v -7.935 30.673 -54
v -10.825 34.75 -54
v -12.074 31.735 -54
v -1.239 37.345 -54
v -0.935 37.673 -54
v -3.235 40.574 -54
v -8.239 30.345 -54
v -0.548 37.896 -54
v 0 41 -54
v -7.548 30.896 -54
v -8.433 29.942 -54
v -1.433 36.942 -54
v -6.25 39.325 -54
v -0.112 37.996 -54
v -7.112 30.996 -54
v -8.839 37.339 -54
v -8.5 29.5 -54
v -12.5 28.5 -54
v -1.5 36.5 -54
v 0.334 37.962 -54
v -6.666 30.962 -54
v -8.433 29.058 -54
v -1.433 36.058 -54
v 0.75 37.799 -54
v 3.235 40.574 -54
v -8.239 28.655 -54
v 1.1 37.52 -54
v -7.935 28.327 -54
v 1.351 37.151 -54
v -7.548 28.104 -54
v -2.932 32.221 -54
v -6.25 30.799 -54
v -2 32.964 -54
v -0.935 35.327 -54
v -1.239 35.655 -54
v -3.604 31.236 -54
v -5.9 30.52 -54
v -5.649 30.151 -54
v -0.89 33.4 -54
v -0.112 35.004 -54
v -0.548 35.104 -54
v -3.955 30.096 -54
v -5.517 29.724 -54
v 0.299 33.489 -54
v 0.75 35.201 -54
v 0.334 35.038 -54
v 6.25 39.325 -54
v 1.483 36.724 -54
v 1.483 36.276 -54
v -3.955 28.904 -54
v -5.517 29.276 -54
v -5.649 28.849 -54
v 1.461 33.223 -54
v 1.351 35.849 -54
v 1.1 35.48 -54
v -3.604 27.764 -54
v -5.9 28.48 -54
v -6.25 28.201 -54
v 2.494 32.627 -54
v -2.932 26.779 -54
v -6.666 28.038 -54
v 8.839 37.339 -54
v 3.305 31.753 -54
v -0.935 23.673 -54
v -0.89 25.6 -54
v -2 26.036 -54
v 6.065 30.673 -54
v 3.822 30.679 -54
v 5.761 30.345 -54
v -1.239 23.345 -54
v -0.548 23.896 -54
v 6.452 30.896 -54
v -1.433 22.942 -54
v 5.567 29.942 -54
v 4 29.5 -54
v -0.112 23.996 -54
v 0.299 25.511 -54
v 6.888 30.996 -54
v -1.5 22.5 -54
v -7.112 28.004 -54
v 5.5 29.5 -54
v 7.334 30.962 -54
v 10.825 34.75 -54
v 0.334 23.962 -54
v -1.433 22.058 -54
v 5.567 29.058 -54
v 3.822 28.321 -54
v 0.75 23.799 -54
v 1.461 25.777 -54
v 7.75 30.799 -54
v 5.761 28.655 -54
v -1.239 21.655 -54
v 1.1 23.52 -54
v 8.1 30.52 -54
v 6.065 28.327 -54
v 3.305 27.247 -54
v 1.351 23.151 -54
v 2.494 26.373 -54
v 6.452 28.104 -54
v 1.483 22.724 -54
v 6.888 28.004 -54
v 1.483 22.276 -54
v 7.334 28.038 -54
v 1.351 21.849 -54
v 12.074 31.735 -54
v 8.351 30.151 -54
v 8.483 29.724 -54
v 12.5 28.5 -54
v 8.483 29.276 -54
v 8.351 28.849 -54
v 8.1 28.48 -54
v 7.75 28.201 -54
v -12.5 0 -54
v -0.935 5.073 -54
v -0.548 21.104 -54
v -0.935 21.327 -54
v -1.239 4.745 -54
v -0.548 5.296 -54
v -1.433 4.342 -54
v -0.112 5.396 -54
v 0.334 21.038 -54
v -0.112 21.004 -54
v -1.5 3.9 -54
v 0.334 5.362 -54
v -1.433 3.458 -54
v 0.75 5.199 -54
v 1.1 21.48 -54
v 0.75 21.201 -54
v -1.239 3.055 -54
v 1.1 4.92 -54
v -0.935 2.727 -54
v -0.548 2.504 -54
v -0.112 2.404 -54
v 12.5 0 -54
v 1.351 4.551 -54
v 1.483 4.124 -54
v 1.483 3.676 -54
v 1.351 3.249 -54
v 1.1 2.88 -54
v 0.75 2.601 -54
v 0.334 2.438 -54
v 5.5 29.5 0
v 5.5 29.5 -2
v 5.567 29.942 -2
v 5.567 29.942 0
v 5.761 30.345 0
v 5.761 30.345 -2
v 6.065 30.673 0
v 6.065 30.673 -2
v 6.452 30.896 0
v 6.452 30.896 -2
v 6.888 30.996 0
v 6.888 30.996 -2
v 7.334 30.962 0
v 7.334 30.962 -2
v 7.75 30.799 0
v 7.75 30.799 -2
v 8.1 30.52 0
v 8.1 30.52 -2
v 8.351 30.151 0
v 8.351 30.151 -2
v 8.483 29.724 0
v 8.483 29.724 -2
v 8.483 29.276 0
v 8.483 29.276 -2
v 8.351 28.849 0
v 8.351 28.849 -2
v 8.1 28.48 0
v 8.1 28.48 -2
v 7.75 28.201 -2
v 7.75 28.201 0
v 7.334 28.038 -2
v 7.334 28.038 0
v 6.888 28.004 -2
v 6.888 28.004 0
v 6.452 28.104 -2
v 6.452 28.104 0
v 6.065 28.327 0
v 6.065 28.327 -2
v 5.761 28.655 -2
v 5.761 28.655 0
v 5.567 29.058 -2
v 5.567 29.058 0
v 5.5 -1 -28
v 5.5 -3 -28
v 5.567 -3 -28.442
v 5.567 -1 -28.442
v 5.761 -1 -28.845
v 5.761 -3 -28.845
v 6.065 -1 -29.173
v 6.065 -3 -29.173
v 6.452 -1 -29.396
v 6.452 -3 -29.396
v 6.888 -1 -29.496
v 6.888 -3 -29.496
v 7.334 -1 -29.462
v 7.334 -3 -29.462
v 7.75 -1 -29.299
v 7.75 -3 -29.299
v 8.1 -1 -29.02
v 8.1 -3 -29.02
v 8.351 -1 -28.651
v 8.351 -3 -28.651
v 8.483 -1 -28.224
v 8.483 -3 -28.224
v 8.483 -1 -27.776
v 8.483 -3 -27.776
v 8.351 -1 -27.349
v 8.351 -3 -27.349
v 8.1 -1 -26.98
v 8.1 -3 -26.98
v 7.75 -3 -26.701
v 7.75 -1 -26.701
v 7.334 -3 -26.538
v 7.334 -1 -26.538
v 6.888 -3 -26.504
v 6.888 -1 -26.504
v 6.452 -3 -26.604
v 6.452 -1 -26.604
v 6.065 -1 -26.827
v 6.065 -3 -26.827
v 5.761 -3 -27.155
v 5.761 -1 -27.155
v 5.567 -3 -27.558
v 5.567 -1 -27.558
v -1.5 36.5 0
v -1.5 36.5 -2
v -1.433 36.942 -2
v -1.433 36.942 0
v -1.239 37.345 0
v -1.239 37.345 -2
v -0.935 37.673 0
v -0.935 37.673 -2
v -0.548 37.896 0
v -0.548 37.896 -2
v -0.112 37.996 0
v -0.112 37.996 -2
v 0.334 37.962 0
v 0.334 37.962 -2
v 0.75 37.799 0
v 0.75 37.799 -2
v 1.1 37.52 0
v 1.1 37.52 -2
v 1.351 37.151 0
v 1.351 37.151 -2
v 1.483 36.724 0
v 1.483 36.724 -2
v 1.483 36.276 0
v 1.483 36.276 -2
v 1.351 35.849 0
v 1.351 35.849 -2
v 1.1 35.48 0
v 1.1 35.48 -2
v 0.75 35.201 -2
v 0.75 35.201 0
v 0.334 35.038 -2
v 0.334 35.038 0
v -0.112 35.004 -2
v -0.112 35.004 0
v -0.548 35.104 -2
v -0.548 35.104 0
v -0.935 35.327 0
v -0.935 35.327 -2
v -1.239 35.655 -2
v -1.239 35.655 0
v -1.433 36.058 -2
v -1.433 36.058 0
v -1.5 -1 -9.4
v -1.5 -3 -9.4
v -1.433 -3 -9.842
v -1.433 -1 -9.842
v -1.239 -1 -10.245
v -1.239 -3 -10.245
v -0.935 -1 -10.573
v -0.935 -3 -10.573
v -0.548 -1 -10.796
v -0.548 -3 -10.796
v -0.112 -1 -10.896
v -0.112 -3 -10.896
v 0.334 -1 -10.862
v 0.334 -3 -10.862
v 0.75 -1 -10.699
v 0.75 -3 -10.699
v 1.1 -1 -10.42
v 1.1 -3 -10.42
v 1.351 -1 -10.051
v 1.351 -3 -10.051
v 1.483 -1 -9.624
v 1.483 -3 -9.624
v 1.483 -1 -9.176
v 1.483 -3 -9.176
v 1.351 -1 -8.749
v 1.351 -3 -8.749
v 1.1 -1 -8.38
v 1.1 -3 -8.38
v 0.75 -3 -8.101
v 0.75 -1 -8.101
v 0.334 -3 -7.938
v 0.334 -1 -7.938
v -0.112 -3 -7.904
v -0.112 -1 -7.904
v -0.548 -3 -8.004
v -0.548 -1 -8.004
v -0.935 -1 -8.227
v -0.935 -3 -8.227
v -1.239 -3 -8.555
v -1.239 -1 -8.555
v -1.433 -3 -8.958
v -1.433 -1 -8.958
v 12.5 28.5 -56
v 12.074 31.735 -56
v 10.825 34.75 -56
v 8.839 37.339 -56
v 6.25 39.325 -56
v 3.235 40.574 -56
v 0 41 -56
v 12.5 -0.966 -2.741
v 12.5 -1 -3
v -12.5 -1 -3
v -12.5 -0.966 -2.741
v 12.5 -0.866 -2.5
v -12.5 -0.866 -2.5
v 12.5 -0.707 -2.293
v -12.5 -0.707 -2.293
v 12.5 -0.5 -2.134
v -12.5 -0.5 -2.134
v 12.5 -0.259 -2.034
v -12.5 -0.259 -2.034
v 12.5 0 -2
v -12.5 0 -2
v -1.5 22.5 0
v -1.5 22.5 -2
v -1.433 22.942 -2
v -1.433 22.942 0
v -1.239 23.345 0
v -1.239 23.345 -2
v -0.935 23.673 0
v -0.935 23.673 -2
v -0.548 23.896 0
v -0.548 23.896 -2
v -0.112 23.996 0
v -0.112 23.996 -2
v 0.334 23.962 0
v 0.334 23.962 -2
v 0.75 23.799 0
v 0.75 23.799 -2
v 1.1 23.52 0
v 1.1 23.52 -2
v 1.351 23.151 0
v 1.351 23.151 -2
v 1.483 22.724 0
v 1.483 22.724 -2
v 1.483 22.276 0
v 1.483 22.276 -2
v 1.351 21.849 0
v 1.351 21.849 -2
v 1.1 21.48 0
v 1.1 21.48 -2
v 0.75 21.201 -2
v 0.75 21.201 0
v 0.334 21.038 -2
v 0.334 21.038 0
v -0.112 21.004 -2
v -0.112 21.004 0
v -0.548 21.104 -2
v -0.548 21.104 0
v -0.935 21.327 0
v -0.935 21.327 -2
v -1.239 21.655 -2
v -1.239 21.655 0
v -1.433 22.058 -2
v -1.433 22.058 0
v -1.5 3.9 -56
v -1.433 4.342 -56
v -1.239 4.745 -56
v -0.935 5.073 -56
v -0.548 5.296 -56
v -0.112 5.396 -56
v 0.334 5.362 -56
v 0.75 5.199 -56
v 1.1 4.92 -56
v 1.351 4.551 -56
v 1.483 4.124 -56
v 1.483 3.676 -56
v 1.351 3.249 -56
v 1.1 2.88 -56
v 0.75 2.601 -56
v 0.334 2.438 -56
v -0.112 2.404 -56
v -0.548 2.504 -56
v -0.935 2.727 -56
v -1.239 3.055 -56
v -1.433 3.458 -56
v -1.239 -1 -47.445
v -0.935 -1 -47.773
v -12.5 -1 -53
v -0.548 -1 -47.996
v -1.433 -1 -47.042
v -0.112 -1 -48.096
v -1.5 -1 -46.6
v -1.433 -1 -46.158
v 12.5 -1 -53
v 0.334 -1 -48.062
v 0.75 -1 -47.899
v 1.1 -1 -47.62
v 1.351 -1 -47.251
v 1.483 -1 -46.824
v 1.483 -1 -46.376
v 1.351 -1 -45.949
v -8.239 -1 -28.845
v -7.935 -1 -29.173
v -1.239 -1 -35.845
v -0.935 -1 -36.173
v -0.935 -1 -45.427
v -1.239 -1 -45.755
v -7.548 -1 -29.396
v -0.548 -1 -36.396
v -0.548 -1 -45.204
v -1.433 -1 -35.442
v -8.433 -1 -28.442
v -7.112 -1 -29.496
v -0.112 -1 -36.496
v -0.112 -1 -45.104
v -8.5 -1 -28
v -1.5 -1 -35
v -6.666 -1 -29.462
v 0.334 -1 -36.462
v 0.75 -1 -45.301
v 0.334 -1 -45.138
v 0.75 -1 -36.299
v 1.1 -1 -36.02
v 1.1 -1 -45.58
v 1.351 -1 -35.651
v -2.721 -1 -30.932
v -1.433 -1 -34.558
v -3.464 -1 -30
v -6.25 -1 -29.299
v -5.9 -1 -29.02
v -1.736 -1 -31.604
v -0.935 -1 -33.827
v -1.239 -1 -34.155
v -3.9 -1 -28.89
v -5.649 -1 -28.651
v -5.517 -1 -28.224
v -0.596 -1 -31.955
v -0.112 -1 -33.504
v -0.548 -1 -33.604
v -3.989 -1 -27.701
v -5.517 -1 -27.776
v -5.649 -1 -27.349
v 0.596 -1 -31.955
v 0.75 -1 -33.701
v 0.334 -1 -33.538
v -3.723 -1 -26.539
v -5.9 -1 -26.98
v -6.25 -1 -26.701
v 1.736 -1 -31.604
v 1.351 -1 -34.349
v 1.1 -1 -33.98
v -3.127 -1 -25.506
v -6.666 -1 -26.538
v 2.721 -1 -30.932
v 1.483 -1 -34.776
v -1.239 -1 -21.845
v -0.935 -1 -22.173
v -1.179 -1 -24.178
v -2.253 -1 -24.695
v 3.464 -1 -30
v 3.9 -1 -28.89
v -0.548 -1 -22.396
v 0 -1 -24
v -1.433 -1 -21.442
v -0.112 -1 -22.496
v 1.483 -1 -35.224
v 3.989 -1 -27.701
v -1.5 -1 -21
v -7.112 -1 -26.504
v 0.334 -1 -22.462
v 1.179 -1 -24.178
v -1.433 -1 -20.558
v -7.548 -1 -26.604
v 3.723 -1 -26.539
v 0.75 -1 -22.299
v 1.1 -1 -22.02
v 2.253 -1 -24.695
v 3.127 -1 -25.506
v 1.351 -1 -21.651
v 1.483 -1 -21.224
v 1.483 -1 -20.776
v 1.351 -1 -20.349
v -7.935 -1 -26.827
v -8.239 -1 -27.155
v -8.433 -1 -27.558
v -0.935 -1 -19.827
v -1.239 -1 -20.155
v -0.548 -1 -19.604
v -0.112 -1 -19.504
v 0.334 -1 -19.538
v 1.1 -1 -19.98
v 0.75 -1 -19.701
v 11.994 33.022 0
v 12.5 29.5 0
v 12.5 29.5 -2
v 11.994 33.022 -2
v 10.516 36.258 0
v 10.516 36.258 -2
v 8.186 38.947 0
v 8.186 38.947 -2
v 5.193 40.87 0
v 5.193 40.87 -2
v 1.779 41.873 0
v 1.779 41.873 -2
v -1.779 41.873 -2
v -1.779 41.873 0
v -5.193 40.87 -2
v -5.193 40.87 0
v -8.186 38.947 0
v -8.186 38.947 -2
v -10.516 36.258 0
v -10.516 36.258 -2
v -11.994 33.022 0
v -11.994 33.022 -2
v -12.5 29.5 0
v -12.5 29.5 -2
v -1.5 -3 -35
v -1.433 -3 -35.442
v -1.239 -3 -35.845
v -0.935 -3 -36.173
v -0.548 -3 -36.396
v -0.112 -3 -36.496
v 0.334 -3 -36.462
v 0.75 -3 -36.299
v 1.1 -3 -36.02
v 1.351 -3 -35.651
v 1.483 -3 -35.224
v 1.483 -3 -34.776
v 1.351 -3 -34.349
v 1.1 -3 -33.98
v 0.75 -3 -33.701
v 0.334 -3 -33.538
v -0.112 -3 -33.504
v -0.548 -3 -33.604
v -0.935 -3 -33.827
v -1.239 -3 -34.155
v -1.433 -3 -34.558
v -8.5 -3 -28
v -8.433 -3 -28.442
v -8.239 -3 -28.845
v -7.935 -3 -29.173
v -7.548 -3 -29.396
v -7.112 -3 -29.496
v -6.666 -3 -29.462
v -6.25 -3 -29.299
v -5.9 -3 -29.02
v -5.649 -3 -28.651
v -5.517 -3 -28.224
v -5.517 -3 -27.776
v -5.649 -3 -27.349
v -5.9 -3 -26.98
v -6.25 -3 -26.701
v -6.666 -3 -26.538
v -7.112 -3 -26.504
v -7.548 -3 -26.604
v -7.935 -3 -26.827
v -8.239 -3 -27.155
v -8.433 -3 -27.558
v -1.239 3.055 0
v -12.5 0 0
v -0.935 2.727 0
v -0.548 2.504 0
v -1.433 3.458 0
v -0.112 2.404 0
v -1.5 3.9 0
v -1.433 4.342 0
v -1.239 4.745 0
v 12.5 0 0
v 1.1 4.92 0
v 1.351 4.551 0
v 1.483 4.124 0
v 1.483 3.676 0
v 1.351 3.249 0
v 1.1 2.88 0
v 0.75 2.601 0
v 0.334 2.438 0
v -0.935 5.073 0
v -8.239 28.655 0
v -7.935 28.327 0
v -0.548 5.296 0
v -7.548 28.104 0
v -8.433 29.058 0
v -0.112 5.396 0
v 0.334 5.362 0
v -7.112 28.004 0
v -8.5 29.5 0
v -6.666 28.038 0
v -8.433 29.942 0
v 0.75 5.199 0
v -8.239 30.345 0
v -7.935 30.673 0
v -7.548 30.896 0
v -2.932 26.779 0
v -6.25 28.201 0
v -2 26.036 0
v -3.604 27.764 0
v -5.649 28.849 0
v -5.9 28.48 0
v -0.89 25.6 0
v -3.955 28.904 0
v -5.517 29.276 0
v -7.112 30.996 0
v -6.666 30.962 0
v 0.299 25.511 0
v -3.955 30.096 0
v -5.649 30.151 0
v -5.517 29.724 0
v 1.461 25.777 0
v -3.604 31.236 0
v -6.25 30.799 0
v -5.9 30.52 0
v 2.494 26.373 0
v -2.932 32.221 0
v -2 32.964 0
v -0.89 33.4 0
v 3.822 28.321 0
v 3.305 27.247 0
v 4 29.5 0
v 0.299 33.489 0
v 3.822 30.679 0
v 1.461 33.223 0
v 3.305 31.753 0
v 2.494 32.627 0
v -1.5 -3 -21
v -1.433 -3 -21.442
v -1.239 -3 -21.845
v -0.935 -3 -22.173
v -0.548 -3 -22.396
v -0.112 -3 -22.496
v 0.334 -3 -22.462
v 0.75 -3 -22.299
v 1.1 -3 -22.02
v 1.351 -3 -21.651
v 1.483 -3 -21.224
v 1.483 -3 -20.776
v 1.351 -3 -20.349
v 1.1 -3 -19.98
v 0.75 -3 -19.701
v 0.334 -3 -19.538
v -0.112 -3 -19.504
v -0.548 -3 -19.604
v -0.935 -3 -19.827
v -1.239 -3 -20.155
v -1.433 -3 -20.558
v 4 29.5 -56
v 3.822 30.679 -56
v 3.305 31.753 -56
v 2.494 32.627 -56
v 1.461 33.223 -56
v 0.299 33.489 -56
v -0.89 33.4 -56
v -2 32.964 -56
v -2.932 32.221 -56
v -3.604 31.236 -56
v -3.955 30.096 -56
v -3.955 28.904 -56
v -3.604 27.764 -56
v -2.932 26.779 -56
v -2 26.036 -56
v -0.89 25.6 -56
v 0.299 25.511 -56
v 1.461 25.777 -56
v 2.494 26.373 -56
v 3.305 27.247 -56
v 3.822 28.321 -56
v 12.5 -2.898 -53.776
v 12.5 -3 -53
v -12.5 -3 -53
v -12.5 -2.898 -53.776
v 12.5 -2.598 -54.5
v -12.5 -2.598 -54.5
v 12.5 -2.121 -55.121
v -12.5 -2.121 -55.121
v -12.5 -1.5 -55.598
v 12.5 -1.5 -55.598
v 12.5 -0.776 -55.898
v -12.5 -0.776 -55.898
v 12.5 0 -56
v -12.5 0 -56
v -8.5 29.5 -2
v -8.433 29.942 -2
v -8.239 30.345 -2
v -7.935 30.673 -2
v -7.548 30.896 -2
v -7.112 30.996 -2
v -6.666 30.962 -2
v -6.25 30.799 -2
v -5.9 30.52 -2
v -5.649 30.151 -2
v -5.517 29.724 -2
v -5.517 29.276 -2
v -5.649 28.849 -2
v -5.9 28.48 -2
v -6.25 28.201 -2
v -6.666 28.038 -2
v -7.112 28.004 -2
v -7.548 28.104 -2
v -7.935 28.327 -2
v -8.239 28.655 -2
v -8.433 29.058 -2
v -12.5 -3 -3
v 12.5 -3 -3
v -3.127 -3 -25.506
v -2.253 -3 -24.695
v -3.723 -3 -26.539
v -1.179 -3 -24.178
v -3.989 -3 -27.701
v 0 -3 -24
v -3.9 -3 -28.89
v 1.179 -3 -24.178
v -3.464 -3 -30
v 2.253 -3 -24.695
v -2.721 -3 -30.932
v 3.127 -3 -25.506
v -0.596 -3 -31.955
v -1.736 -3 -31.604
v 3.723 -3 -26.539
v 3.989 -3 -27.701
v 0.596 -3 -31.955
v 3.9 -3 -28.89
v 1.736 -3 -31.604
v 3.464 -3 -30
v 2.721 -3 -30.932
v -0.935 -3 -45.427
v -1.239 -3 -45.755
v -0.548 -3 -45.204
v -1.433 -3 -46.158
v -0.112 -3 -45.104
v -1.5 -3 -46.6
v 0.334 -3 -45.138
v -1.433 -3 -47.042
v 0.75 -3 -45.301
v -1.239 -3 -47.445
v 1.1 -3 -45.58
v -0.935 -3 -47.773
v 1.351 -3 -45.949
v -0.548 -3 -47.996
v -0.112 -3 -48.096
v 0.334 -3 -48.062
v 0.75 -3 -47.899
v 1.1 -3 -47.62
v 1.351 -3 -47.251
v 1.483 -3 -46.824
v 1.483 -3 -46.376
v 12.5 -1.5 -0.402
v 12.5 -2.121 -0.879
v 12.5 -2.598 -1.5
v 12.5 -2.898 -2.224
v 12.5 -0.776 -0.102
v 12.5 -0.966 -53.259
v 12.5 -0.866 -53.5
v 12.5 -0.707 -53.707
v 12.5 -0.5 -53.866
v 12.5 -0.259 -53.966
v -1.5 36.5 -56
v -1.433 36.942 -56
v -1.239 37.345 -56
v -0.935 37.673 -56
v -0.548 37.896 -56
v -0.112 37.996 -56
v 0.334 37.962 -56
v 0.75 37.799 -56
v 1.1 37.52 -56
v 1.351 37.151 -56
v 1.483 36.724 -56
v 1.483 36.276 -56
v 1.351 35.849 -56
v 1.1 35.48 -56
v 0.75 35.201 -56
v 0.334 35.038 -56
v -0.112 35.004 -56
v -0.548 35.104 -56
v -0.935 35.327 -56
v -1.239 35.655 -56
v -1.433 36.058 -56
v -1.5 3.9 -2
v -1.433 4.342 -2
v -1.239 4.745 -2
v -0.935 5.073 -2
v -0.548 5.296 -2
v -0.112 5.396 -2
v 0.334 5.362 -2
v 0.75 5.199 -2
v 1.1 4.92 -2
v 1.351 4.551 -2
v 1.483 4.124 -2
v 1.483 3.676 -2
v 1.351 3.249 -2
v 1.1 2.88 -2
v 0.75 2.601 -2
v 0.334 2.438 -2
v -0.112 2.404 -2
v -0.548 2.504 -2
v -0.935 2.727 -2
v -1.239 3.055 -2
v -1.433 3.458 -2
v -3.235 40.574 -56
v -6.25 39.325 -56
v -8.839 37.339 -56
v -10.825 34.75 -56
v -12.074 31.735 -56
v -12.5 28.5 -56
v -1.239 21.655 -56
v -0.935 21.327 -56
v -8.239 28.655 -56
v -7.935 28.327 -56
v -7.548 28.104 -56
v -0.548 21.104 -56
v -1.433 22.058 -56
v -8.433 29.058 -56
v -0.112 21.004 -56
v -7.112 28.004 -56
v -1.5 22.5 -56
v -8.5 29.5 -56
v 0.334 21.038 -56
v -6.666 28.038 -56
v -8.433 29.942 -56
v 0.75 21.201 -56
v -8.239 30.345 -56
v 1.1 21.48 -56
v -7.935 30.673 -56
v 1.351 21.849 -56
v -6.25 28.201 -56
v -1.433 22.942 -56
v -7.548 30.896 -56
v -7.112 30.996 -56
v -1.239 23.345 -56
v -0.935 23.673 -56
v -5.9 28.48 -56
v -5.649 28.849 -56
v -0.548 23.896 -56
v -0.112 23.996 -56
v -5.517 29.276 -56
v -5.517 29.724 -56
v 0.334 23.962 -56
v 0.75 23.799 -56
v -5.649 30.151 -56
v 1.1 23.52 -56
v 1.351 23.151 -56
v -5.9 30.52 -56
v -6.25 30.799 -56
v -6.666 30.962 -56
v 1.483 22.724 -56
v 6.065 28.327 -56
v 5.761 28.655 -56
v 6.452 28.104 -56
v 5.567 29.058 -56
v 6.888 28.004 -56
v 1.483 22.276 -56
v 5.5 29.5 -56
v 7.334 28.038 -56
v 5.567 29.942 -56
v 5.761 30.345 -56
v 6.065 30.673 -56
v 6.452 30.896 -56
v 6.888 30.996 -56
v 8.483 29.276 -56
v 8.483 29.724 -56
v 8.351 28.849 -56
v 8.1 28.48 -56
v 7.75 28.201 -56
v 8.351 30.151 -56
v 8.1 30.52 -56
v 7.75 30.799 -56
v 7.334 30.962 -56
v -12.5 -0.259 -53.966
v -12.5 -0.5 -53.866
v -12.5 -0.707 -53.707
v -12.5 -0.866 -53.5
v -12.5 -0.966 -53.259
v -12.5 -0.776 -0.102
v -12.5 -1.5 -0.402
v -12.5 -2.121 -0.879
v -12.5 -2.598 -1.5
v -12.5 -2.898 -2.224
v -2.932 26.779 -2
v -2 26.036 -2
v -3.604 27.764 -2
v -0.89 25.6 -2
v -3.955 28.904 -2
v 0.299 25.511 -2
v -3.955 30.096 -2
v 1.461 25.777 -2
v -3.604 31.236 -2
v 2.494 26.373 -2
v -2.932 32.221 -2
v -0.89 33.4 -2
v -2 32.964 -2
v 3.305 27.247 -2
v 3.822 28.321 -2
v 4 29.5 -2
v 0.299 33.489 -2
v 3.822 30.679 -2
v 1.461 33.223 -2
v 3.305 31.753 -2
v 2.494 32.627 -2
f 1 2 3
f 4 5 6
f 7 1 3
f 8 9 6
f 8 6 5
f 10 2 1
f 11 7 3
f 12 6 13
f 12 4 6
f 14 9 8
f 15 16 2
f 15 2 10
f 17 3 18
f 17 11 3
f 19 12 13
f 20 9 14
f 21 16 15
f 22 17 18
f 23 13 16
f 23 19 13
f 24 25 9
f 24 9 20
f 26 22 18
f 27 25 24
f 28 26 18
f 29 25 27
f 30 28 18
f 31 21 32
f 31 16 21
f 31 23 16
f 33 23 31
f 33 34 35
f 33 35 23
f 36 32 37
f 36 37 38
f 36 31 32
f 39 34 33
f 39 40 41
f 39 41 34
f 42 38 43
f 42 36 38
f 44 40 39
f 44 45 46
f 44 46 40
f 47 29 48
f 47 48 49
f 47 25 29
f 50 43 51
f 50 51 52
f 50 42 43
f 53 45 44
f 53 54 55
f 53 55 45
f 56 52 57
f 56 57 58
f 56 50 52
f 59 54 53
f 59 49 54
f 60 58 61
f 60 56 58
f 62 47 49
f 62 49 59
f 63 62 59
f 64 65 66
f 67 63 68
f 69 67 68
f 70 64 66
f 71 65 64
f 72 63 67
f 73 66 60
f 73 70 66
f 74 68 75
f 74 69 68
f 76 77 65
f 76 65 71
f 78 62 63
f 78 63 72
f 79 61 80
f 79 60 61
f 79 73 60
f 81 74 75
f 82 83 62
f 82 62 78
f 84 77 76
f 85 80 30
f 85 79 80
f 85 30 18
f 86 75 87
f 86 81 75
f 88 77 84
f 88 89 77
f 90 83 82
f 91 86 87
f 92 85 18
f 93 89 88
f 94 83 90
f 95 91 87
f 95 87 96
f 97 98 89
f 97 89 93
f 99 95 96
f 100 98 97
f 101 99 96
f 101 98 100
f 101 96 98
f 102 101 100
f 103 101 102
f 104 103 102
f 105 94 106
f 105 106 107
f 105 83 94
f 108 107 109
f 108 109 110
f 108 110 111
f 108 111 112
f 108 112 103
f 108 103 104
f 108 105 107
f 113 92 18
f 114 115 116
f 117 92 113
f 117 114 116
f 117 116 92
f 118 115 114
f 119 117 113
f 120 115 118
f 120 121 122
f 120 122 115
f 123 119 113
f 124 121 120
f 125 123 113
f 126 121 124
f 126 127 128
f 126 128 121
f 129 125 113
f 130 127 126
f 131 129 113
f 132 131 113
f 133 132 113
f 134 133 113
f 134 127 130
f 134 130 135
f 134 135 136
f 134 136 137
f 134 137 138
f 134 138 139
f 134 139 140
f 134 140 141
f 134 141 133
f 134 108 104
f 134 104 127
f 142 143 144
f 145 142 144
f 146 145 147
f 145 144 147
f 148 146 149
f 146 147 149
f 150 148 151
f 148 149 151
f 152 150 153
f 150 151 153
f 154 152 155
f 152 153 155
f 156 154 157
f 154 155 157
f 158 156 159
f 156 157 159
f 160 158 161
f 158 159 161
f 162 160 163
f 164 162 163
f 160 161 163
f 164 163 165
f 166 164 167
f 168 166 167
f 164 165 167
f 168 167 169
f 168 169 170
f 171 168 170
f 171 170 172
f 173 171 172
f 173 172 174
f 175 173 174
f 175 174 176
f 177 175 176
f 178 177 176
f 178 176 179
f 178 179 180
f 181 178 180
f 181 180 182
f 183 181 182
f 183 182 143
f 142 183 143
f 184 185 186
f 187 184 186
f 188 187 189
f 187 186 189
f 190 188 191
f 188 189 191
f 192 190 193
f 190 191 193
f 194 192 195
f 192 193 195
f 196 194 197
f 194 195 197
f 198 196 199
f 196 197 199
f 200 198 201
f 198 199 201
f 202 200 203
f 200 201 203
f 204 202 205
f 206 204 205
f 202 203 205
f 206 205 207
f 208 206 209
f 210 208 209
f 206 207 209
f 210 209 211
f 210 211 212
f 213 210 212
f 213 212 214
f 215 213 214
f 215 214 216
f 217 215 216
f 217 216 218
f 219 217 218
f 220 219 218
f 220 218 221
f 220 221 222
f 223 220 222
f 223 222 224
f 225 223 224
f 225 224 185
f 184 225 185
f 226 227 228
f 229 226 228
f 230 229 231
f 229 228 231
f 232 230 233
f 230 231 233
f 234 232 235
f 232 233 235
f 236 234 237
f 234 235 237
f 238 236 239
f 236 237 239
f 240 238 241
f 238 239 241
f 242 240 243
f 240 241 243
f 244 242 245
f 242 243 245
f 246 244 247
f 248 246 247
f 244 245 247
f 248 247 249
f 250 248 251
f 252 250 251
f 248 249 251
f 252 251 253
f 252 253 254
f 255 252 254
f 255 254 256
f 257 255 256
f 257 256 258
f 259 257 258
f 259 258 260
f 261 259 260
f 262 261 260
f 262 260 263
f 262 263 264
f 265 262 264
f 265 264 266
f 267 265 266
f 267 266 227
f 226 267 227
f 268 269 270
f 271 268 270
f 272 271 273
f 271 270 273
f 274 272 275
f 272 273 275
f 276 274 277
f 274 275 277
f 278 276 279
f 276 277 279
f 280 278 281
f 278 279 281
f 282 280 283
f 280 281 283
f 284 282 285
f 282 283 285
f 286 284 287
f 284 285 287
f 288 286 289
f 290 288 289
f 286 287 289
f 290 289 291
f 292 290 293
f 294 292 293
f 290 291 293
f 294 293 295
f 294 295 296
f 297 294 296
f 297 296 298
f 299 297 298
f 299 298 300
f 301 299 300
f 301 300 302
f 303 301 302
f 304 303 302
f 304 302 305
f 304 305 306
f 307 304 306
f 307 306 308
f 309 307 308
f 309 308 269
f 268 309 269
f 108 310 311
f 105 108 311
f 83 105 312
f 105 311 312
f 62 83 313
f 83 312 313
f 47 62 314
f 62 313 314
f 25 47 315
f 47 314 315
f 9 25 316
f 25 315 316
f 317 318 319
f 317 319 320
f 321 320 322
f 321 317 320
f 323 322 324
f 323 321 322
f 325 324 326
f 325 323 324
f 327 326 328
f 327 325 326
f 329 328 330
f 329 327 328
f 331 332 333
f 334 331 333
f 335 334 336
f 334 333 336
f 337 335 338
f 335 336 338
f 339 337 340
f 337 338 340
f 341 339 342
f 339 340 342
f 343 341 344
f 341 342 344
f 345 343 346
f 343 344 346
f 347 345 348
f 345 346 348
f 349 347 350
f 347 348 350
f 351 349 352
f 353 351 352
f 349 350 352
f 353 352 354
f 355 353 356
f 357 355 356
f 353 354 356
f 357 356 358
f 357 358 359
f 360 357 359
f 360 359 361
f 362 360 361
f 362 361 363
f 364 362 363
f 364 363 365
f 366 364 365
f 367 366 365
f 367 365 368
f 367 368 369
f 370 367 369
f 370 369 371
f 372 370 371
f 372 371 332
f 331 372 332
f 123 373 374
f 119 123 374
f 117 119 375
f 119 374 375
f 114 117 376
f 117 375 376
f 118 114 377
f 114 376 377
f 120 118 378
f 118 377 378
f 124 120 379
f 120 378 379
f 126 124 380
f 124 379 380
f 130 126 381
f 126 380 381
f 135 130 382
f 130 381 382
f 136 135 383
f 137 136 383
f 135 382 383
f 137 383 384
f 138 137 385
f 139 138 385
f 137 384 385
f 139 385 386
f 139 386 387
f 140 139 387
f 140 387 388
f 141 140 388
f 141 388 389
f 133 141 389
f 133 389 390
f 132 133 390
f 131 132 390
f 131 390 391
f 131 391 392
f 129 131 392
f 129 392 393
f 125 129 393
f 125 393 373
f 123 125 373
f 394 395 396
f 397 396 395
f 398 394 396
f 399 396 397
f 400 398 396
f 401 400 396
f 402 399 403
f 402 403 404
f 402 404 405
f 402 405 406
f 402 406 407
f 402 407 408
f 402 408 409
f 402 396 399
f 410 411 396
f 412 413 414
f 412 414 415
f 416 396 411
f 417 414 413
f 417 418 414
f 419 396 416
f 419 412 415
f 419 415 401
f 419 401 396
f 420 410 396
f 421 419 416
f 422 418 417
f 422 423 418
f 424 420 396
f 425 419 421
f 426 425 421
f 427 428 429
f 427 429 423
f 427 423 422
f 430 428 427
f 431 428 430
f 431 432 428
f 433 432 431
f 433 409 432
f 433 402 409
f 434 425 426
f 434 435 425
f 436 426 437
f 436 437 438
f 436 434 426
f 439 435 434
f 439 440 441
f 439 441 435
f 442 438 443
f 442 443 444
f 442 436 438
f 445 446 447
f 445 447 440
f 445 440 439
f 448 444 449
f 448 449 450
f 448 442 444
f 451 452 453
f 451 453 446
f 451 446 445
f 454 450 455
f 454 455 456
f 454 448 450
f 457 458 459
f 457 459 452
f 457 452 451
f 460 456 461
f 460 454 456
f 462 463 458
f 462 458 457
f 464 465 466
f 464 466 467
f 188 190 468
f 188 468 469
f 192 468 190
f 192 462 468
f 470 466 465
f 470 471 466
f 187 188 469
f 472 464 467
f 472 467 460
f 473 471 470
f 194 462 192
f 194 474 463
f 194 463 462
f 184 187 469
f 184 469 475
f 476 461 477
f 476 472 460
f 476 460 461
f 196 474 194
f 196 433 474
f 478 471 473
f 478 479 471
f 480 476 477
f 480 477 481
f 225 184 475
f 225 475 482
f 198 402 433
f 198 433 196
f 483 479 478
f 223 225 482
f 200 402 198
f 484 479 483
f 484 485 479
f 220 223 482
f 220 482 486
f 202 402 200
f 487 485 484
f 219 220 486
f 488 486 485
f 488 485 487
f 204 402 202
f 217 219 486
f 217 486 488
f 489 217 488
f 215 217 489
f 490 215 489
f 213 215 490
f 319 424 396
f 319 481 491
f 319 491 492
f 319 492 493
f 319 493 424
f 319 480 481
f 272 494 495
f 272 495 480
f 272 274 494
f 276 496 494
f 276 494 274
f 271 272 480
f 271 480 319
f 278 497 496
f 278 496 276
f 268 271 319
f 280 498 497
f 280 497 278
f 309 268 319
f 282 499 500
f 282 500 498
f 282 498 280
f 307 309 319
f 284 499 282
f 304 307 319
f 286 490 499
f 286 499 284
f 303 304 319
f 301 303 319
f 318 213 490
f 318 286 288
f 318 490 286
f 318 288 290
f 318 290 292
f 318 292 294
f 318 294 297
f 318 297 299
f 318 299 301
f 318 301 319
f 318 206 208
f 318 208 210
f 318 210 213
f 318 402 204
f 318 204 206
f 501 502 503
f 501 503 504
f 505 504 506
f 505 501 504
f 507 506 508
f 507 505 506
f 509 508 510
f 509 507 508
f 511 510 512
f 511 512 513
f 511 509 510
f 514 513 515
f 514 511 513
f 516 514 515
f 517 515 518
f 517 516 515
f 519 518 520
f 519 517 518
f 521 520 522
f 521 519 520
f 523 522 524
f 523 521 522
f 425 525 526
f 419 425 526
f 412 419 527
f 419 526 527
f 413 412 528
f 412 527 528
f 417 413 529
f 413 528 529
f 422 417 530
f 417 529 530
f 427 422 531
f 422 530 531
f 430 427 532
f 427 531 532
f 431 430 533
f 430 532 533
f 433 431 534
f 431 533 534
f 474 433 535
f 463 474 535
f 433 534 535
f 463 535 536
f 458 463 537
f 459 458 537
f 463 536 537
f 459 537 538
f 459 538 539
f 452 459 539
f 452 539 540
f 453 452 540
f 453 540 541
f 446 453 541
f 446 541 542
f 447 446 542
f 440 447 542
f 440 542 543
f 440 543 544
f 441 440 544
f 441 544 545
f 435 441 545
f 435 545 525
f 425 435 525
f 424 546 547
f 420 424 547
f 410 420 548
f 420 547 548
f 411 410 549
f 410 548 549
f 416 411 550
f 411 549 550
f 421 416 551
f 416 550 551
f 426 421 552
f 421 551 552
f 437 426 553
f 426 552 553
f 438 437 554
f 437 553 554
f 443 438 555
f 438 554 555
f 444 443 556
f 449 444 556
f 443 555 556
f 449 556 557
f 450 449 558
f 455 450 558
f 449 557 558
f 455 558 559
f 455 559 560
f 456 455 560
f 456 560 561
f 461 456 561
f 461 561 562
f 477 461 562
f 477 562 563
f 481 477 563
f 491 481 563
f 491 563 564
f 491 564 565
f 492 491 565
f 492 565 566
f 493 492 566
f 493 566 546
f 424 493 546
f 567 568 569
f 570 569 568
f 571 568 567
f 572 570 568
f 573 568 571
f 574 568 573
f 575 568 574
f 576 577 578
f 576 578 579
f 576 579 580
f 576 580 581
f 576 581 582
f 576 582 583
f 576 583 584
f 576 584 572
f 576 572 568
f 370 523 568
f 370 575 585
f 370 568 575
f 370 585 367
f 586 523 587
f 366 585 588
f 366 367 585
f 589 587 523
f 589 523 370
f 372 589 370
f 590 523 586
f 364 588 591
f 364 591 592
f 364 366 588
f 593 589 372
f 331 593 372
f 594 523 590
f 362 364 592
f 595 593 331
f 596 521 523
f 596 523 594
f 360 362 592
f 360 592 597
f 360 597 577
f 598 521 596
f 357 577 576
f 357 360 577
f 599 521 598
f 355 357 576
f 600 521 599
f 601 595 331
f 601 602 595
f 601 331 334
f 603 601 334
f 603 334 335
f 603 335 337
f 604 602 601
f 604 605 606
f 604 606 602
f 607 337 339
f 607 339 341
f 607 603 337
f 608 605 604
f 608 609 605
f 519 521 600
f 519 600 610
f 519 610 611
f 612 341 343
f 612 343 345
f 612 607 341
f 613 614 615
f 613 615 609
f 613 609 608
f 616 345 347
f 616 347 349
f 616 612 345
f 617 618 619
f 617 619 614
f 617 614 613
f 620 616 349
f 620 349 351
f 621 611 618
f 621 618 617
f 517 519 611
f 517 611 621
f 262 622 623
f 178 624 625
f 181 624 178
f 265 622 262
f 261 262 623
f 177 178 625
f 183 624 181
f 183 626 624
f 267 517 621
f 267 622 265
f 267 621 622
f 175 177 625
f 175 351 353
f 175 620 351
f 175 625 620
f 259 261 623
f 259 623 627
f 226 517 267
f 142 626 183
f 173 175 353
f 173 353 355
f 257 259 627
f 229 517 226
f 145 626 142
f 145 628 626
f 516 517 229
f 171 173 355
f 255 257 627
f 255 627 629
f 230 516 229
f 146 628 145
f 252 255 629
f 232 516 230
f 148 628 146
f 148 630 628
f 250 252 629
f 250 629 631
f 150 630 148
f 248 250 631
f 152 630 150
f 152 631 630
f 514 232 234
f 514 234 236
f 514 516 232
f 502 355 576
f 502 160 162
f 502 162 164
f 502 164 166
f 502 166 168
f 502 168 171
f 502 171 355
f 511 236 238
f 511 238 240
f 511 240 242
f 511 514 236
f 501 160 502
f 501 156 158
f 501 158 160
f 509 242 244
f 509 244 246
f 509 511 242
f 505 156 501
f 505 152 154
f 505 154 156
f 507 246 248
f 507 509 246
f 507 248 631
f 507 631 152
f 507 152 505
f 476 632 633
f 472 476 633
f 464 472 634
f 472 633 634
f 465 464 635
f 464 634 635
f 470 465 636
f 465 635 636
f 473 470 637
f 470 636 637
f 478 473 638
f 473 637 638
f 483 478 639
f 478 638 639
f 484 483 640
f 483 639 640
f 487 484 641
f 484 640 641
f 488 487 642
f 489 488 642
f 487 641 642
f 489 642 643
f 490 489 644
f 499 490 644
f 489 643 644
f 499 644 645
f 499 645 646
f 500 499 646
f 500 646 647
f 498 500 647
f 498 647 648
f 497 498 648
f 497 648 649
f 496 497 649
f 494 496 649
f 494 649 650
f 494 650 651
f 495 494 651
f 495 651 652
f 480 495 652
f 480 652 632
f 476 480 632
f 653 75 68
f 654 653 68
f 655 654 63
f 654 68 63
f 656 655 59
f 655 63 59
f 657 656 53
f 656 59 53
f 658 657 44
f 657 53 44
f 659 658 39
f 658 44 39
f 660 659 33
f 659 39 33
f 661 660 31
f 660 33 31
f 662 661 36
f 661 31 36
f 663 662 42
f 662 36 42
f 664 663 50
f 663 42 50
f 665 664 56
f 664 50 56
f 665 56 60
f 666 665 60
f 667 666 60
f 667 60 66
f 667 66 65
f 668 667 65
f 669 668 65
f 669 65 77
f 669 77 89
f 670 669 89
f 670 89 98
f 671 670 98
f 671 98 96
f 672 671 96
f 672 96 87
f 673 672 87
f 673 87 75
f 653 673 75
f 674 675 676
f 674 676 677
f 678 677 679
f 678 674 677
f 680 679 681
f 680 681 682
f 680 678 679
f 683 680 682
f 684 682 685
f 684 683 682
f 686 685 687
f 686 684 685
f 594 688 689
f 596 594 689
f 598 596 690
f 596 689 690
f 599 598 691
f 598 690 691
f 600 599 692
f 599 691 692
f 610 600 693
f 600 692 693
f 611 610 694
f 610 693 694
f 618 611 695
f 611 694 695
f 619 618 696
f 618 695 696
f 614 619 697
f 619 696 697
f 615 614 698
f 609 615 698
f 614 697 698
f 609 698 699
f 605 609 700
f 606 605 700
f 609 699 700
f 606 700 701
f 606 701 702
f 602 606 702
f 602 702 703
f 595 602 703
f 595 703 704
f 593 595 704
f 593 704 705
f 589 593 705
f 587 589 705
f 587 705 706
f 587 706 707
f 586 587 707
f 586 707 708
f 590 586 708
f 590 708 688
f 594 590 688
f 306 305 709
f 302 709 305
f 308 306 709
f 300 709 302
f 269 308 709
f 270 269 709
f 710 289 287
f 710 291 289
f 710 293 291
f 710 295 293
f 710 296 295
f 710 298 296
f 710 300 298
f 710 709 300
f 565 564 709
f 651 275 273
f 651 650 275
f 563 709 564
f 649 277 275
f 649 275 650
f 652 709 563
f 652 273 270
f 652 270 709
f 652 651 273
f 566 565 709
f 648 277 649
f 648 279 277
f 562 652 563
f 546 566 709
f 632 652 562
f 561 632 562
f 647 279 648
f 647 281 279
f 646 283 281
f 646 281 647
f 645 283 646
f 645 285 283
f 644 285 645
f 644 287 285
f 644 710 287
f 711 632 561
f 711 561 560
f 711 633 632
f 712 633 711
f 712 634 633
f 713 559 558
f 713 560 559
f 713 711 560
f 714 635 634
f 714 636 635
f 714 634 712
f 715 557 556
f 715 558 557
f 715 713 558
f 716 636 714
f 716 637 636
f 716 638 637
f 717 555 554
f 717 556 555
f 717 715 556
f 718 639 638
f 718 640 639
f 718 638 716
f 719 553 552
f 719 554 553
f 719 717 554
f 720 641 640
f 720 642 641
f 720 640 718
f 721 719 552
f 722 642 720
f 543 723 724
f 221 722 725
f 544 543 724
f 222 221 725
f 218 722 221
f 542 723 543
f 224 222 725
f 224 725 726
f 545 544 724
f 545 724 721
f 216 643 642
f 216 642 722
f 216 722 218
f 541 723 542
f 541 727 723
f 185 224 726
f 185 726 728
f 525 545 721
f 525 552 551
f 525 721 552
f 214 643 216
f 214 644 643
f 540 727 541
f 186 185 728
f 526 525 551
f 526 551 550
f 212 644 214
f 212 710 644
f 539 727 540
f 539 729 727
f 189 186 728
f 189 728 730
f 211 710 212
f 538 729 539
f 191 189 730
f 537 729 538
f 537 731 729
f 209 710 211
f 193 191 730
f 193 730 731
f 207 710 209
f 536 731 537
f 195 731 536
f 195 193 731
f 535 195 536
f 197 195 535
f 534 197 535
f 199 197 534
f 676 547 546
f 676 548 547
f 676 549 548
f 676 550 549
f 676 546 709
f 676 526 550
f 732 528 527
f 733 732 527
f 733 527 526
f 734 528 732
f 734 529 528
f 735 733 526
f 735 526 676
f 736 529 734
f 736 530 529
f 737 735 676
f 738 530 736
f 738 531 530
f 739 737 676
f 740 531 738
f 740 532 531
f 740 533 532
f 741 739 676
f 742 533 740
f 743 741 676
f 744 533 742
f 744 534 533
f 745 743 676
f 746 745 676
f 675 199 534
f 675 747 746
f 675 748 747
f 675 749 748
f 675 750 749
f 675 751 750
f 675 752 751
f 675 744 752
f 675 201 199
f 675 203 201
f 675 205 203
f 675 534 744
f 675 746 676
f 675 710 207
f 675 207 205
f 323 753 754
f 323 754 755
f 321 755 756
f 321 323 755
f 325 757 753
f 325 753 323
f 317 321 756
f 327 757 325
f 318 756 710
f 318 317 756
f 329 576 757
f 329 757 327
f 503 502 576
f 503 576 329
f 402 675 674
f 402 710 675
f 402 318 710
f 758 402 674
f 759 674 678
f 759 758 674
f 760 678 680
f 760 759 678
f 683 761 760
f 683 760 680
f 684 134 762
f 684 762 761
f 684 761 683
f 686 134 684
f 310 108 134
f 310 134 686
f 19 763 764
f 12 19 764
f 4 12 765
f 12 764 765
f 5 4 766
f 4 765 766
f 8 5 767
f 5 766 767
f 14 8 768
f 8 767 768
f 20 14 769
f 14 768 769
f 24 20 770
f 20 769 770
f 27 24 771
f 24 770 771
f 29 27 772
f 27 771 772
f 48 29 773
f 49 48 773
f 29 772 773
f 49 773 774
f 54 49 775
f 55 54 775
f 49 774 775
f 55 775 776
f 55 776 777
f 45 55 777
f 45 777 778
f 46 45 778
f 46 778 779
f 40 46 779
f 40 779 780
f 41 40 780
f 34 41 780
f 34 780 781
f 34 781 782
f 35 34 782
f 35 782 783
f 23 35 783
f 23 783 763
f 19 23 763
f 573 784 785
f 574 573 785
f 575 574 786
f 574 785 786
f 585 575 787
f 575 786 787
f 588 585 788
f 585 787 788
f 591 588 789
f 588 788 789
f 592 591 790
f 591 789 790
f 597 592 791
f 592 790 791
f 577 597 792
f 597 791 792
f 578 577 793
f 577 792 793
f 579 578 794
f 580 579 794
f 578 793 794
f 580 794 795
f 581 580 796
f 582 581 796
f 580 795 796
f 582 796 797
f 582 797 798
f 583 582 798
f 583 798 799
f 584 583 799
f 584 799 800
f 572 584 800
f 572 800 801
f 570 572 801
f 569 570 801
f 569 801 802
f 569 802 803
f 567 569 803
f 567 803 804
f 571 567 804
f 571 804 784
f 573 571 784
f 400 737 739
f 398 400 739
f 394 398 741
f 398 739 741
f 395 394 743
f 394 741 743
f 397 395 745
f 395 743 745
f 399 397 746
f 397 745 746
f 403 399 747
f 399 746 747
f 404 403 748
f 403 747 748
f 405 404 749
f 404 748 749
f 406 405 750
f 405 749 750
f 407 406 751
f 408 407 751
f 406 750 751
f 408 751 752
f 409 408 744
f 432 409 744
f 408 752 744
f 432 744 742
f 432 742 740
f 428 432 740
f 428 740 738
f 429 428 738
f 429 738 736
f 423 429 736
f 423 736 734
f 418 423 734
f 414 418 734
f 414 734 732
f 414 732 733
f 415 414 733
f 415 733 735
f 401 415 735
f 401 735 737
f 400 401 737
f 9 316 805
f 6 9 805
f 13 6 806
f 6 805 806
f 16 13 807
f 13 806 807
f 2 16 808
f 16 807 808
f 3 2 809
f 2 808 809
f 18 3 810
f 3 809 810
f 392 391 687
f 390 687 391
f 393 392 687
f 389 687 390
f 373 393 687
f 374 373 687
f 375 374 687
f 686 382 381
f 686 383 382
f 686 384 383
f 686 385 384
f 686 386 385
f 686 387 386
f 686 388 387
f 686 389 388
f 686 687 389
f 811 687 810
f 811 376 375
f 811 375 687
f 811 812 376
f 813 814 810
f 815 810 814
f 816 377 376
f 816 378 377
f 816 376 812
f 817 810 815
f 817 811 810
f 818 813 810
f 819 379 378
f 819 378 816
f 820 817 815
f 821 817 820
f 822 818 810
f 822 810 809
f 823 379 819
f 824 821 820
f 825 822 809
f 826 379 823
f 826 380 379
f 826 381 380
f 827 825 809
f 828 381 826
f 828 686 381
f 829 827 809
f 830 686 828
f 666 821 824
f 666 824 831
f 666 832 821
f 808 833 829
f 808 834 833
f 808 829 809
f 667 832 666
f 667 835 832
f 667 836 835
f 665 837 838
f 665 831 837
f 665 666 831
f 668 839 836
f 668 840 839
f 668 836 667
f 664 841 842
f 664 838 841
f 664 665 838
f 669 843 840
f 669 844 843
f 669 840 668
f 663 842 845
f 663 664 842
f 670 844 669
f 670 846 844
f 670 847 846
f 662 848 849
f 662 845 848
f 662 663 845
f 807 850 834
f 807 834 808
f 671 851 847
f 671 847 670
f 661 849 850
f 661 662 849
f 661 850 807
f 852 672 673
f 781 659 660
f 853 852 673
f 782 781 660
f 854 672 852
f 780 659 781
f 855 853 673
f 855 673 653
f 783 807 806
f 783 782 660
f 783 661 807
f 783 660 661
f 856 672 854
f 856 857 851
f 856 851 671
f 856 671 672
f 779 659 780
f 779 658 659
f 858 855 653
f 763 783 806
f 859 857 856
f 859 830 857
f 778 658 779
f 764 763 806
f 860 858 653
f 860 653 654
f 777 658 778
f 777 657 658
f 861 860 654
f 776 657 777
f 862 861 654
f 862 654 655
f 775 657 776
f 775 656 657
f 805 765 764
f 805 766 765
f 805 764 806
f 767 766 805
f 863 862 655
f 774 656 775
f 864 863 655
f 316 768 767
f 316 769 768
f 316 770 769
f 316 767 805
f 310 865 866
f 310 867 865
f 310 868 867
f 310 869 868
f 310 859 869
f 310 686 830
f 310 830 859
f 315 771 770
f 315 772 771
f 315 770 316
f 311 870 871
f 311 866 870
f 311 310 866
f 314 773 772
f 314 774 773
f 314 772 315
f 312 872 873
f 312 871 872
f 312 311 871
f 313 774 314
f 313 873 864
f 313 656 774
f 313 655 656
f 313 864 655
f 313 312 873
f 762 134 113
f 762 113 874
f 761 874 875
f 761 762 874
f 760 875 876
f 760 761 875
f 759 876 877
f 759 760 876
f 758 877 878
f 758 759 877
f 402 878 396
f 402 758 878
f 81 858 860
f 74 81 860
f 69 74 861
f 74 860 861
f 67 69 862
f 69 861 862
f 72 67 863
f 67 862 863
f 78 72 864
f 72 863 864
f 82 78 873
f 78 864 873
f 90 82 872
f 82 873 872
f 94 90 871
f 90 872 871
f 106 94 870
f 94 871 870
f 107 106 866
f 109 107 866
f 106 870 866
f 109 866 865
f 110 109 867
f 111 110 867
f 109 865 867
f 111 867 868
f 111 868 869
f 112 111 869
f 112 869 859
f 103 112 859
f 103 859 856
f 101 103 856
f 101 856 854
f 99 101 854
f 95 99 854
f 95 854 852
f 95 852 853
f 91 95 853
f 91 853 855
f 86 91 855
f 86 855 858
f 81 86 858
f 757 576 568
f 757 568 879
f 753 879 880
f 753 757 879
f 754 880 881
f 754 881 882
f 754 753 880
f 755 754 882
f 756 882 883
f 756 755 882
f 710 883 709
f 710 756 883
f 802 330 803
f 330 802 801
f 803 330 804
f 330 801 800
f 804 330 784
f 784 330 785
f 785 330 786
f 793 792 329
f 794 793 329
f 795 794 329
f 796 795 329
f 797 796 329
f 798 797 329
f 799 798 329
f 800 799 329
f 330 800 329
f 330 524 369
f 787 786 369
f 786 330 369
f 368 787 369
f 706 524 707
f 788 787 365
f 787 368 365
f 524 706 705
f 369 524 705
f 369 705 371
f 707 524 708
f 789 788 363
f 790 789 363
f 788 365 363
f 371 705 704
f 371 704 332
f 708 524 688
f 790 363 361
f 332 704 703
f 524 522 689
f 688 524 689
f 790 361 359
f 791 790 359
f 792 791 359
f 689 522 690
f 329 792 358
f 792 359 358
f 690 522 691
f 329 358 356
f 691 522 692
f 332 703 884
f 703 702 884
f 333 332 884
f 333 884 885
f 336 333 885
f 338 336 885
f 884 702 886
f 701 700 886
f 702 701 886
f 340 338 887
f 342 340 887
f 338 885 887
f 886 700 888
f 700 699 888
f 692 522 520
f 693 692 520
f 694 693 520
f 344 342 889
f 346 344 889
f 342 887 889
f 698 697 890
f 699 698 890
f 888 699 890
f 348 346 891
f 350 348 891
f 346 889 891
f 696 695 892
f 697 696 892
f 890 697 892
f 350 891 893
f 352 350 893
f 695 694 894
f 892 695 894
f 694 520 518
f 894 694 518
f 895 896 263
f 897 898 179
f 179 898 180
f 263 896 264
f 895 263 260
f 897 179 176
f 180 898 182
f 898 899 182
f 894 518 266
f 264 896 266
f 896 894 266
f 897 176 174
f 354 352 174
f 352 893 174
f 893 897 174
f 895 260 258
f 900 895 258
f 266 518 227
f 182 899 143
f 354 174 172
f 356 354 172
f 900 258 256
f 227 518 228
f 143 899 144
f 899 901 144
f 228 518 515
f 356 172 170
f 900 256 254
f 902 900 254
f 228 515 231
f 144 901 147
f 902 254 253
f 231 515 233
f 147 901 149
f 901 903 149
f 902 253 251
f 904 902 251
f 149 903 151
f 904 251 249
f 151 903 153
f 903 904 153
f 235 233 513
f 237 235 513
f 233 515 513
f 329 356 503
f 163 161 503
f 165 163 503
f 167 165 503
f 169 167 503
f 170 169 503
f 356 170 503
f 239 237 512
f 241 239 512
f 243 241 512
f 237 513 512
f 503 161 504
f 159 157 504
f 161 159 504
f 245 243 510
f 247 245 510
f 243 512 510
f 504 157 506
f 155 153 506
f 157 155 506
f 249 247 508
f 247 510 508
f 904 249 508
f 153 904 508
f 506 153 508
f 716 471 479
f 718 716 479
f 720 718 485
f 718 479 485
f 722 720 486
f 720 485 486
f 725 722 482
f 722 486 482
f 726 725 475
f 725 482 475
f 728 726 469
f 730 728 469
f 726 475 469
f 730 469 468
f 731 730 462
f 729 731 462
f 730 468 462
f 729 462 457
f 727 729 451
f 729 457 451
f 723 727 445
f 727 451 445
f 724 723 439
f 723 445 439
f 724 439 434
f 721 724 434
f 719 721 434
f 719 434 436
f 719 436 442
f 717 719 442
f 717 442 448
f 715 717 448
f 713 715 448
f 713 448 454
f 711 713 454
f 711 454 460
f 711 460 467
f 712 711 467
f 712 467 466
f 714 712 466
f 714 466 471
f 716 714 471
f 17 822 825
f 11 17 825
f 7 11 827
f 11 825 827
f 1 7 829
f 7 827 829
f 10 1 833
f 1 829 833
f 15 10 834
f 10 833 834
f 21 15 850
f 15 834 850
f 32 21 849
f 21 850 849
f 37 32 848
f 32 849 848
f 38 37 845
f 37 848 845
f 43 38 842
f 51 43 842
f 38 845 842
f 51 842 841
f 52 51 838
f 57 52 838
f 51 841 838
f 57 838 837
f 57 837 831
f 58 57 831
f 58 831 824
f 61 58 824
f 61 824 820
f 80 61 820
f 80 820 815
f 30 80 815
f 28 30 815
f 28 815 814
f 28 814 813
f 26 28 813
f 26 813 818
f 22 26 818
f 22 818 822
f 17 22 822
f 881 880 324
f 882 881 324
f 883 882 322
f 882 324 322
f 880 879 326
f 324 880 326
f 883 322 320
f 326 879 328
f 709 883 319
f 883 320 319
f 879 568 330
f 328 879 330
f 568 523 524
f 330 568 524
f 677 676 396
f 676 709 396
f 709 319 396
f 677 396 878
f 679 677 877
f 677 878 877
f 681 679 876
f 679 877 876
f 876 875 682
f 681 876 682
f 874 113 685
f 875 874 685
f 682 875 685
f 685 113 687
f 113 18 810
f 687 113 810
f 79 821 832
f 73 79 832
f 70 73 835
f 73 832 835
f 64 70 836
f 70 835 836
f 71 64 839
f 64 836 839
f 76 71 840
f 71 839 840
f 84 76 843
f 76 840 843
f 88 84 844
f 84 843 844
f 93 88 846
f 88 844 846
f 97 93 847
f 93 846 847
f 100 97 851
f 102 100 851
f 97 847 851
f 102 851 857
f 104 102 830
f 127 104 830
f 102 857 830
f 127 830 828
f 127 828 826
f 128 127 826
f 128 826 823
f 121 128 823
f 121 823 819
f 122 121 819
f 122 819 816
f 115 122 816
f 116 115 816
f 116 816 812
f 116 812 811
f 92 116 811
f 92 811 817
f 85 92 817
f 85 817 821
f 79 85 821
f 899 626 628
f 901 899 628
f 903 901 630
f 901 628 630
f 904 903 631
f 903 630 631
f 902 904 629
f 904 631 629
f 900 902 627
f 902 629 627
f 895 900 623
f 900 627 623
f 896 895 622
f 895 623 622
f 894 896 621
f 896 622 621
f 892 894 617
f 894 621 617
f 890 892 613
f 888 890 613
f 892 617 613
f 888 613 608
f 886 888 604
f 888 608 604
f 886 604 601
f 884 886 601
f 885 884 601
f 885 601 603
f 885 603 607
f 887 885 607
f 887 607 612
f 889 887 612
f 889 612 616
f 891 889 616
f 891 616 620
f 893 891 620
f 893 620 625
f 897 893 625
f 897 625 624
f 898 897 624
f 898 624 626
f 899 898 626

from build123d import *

# Parameters (mm, degrees)
BASE_FLANGE1_DEPTH           = 2
EDGE_FLANGE1_DEPTH           = 25
EDGE_FLANGE2_STRIP_W         = 10
EDGE_FLANGE2_STRIP_H         = 2
EDGE_FLANGE2_STRIP_CUT_DEPTH = 25
EDGE_FLANGE2_DEPTH           = 25
CUT_EXTRUDE1_DEPTH           = 2
SKETCH19_R                   = 4
CUT_EXTRUDE2_DEPTH           = 72.107313267
M3X0_5_TAPPED_HOLE1_D        = 3
SKETCH22_R                   = 4
CUT_EXTRUDE3_DEPTH           = 72.702510416
M3X0_5_TAPPED_HOLE2_D        = 3


# Sheet-metal steps are written as plain solids
with BuildPart() as part:
    # Sketch8 → Base-Flange1 (new body)
    with BuildSketch(Plane.XY):
        with BuildLine():
            Line((-12.5, 0), (12.5, 0))
            Line((12.5, 0), (12.5, 29.5))
            ThreePointArc((12.5, 29.5), (0, 42), (-12.5, 29.5))
            Line((-12.5, 29.5), (-12.5, 0))
        make_face()
    extrude(amount=-BASE_FLANGE1_DEPTH)

    # Edge-Flange1 section (across the edge) → Edge-Flange1 (add)
    with BuildSketch(Plane(origin=(12.5, -1, -2), x_dir=(0, 1, 0), z_dir=(-1, 0, 0))):
        with BuildLine():
            Line((-2, 1), (-2, 52))
            Line((-2, 52), (0, 52))
            Line((0, 52), (0, 1))
            ThreePointArc((0, 1), (0.292893219, 0.292893219), (1, 0))
            Line((1, 0), (1, -2))
            ThreePointArc((1, -2), (-1.121320344, -1.121320344), (-2, 1))
        make_face()
    extrude(amount=EDGE_FLANGE1_DEPTH)

    # Edge-Flange2 strip (across the edge) → Edge-Flange2 strip cut (cut)
    with BuildSketch(Plane(origin=(12.5, -1, -54), x_dir=(0, 0, 1), z_dir=(-1, 0, 0))):
        with Locations((-4, -1)):
            Rectangle(EDGE_FLANGE2_STRIP_W, EDGE_FLANGE2_STRIP_H)
    extrude(amount=EDGE_FLANGE2_STRIP_CUT_DEPTH, mode=Mode.SUBTRACT)

    # Edge-Flange2 section (across the edge) → Edge-Flange2 (add)
    with BuildSketch(Plane(origin=(12.5, -1, -54), x_dir=(0, 0, 1), z_dir=(-1, 0, 0))):
        with BuildLine():
            Line((-2, 1), (-2, 42))
            Line((-2, 42), (0, 42))
            Line((0, 42), (0, 1))
            ThreePointArc((0, 1), (0.292893219, 0.292893219), (1, 0))
            Line((1, 0), (1, -2))
            ThreePointArc((1, -2), (-1.121320344, -1.121320344), (-2, 1))
        make_face()
    extrude(amount=EDGE_FLANGE2_DEPTH)

    # Sketch18 → Cut-Extrude1 (cut)
    with BuildSketch(Plane(origin=(0, 0, -56), x_dir=(-1, 0, 0), z_dir=(0, 0, -1))):
        with BuildLine():
            ThreePointArc((2e-08, 41), (8.838834772, 37.338834758), (12.5, 28.5))
            Line((12.5, 28.5), (12.5, 41))
            Line((12.5, 41), (2e-08, 41))
        make_face()
        with BuildLine():
            ThreePointArc((-12.5, 28.5), (-8.838834758, 37.338834772), (2e-08, 41))
            Line((2e-08, 41), (-12.5, 41))
            Line((-12.5, 41), (-12.5, 28.5))
        make_face()
    extrude(amount=-CUT_EXTRUDE1_DEPTH, mode=Mode.SUBTRACT)

    # Sketch19 → Cut-Extrude2 (cut, through all)
    with BuildSketch(Plane.XY):
        with Locations((0, 29.5)):
            Circle(SKETCH19_R)
    extrude(amount=-CUT_EXTRUDE2_DEPTH, mode=Mode.SUBTRACT)

    # M3x0.5 Tapped Hole1 (through all)
    with Locations(Plane.XY):
        with Locations((0, 36.5), (-7, 29.5), (0, 22.5), (7, 29.5), (0, 3.9), (0, -12.97)):
            Hole(M3X0_5_TAPPED_HOLE1_D / 2)

    # Sketch22 → Cut-Extrude3 (cut, through all)
    with BuildSketch(Plane(origin=(0, -1, 0), x_dir=(1, 0, 0), z_dir=(0, 1, 0))):
        with Locations(Location((0, 28, 0), (0, 0, 270))):
            Circle(SKETCH22_R)
    extrude(amount=-CUT_EXTRUDE3_DEPTH, mode=Mode.SUBTRACT)

    # M3x0.5 Tapped Hole2 (through all)
    with Locations(Plane(origin=(0, -1, 0), x_dir=(1, 0, 0), z_dir=(0, 1, 0))):
        with Locations((7, 28), (-7, 28), (0, 35), (0, 21), (0, 9.4), (0, 46.6)):
            Hole(M3X0_5_TAPPED_HOLE2_D / 2)


solid = part.part
